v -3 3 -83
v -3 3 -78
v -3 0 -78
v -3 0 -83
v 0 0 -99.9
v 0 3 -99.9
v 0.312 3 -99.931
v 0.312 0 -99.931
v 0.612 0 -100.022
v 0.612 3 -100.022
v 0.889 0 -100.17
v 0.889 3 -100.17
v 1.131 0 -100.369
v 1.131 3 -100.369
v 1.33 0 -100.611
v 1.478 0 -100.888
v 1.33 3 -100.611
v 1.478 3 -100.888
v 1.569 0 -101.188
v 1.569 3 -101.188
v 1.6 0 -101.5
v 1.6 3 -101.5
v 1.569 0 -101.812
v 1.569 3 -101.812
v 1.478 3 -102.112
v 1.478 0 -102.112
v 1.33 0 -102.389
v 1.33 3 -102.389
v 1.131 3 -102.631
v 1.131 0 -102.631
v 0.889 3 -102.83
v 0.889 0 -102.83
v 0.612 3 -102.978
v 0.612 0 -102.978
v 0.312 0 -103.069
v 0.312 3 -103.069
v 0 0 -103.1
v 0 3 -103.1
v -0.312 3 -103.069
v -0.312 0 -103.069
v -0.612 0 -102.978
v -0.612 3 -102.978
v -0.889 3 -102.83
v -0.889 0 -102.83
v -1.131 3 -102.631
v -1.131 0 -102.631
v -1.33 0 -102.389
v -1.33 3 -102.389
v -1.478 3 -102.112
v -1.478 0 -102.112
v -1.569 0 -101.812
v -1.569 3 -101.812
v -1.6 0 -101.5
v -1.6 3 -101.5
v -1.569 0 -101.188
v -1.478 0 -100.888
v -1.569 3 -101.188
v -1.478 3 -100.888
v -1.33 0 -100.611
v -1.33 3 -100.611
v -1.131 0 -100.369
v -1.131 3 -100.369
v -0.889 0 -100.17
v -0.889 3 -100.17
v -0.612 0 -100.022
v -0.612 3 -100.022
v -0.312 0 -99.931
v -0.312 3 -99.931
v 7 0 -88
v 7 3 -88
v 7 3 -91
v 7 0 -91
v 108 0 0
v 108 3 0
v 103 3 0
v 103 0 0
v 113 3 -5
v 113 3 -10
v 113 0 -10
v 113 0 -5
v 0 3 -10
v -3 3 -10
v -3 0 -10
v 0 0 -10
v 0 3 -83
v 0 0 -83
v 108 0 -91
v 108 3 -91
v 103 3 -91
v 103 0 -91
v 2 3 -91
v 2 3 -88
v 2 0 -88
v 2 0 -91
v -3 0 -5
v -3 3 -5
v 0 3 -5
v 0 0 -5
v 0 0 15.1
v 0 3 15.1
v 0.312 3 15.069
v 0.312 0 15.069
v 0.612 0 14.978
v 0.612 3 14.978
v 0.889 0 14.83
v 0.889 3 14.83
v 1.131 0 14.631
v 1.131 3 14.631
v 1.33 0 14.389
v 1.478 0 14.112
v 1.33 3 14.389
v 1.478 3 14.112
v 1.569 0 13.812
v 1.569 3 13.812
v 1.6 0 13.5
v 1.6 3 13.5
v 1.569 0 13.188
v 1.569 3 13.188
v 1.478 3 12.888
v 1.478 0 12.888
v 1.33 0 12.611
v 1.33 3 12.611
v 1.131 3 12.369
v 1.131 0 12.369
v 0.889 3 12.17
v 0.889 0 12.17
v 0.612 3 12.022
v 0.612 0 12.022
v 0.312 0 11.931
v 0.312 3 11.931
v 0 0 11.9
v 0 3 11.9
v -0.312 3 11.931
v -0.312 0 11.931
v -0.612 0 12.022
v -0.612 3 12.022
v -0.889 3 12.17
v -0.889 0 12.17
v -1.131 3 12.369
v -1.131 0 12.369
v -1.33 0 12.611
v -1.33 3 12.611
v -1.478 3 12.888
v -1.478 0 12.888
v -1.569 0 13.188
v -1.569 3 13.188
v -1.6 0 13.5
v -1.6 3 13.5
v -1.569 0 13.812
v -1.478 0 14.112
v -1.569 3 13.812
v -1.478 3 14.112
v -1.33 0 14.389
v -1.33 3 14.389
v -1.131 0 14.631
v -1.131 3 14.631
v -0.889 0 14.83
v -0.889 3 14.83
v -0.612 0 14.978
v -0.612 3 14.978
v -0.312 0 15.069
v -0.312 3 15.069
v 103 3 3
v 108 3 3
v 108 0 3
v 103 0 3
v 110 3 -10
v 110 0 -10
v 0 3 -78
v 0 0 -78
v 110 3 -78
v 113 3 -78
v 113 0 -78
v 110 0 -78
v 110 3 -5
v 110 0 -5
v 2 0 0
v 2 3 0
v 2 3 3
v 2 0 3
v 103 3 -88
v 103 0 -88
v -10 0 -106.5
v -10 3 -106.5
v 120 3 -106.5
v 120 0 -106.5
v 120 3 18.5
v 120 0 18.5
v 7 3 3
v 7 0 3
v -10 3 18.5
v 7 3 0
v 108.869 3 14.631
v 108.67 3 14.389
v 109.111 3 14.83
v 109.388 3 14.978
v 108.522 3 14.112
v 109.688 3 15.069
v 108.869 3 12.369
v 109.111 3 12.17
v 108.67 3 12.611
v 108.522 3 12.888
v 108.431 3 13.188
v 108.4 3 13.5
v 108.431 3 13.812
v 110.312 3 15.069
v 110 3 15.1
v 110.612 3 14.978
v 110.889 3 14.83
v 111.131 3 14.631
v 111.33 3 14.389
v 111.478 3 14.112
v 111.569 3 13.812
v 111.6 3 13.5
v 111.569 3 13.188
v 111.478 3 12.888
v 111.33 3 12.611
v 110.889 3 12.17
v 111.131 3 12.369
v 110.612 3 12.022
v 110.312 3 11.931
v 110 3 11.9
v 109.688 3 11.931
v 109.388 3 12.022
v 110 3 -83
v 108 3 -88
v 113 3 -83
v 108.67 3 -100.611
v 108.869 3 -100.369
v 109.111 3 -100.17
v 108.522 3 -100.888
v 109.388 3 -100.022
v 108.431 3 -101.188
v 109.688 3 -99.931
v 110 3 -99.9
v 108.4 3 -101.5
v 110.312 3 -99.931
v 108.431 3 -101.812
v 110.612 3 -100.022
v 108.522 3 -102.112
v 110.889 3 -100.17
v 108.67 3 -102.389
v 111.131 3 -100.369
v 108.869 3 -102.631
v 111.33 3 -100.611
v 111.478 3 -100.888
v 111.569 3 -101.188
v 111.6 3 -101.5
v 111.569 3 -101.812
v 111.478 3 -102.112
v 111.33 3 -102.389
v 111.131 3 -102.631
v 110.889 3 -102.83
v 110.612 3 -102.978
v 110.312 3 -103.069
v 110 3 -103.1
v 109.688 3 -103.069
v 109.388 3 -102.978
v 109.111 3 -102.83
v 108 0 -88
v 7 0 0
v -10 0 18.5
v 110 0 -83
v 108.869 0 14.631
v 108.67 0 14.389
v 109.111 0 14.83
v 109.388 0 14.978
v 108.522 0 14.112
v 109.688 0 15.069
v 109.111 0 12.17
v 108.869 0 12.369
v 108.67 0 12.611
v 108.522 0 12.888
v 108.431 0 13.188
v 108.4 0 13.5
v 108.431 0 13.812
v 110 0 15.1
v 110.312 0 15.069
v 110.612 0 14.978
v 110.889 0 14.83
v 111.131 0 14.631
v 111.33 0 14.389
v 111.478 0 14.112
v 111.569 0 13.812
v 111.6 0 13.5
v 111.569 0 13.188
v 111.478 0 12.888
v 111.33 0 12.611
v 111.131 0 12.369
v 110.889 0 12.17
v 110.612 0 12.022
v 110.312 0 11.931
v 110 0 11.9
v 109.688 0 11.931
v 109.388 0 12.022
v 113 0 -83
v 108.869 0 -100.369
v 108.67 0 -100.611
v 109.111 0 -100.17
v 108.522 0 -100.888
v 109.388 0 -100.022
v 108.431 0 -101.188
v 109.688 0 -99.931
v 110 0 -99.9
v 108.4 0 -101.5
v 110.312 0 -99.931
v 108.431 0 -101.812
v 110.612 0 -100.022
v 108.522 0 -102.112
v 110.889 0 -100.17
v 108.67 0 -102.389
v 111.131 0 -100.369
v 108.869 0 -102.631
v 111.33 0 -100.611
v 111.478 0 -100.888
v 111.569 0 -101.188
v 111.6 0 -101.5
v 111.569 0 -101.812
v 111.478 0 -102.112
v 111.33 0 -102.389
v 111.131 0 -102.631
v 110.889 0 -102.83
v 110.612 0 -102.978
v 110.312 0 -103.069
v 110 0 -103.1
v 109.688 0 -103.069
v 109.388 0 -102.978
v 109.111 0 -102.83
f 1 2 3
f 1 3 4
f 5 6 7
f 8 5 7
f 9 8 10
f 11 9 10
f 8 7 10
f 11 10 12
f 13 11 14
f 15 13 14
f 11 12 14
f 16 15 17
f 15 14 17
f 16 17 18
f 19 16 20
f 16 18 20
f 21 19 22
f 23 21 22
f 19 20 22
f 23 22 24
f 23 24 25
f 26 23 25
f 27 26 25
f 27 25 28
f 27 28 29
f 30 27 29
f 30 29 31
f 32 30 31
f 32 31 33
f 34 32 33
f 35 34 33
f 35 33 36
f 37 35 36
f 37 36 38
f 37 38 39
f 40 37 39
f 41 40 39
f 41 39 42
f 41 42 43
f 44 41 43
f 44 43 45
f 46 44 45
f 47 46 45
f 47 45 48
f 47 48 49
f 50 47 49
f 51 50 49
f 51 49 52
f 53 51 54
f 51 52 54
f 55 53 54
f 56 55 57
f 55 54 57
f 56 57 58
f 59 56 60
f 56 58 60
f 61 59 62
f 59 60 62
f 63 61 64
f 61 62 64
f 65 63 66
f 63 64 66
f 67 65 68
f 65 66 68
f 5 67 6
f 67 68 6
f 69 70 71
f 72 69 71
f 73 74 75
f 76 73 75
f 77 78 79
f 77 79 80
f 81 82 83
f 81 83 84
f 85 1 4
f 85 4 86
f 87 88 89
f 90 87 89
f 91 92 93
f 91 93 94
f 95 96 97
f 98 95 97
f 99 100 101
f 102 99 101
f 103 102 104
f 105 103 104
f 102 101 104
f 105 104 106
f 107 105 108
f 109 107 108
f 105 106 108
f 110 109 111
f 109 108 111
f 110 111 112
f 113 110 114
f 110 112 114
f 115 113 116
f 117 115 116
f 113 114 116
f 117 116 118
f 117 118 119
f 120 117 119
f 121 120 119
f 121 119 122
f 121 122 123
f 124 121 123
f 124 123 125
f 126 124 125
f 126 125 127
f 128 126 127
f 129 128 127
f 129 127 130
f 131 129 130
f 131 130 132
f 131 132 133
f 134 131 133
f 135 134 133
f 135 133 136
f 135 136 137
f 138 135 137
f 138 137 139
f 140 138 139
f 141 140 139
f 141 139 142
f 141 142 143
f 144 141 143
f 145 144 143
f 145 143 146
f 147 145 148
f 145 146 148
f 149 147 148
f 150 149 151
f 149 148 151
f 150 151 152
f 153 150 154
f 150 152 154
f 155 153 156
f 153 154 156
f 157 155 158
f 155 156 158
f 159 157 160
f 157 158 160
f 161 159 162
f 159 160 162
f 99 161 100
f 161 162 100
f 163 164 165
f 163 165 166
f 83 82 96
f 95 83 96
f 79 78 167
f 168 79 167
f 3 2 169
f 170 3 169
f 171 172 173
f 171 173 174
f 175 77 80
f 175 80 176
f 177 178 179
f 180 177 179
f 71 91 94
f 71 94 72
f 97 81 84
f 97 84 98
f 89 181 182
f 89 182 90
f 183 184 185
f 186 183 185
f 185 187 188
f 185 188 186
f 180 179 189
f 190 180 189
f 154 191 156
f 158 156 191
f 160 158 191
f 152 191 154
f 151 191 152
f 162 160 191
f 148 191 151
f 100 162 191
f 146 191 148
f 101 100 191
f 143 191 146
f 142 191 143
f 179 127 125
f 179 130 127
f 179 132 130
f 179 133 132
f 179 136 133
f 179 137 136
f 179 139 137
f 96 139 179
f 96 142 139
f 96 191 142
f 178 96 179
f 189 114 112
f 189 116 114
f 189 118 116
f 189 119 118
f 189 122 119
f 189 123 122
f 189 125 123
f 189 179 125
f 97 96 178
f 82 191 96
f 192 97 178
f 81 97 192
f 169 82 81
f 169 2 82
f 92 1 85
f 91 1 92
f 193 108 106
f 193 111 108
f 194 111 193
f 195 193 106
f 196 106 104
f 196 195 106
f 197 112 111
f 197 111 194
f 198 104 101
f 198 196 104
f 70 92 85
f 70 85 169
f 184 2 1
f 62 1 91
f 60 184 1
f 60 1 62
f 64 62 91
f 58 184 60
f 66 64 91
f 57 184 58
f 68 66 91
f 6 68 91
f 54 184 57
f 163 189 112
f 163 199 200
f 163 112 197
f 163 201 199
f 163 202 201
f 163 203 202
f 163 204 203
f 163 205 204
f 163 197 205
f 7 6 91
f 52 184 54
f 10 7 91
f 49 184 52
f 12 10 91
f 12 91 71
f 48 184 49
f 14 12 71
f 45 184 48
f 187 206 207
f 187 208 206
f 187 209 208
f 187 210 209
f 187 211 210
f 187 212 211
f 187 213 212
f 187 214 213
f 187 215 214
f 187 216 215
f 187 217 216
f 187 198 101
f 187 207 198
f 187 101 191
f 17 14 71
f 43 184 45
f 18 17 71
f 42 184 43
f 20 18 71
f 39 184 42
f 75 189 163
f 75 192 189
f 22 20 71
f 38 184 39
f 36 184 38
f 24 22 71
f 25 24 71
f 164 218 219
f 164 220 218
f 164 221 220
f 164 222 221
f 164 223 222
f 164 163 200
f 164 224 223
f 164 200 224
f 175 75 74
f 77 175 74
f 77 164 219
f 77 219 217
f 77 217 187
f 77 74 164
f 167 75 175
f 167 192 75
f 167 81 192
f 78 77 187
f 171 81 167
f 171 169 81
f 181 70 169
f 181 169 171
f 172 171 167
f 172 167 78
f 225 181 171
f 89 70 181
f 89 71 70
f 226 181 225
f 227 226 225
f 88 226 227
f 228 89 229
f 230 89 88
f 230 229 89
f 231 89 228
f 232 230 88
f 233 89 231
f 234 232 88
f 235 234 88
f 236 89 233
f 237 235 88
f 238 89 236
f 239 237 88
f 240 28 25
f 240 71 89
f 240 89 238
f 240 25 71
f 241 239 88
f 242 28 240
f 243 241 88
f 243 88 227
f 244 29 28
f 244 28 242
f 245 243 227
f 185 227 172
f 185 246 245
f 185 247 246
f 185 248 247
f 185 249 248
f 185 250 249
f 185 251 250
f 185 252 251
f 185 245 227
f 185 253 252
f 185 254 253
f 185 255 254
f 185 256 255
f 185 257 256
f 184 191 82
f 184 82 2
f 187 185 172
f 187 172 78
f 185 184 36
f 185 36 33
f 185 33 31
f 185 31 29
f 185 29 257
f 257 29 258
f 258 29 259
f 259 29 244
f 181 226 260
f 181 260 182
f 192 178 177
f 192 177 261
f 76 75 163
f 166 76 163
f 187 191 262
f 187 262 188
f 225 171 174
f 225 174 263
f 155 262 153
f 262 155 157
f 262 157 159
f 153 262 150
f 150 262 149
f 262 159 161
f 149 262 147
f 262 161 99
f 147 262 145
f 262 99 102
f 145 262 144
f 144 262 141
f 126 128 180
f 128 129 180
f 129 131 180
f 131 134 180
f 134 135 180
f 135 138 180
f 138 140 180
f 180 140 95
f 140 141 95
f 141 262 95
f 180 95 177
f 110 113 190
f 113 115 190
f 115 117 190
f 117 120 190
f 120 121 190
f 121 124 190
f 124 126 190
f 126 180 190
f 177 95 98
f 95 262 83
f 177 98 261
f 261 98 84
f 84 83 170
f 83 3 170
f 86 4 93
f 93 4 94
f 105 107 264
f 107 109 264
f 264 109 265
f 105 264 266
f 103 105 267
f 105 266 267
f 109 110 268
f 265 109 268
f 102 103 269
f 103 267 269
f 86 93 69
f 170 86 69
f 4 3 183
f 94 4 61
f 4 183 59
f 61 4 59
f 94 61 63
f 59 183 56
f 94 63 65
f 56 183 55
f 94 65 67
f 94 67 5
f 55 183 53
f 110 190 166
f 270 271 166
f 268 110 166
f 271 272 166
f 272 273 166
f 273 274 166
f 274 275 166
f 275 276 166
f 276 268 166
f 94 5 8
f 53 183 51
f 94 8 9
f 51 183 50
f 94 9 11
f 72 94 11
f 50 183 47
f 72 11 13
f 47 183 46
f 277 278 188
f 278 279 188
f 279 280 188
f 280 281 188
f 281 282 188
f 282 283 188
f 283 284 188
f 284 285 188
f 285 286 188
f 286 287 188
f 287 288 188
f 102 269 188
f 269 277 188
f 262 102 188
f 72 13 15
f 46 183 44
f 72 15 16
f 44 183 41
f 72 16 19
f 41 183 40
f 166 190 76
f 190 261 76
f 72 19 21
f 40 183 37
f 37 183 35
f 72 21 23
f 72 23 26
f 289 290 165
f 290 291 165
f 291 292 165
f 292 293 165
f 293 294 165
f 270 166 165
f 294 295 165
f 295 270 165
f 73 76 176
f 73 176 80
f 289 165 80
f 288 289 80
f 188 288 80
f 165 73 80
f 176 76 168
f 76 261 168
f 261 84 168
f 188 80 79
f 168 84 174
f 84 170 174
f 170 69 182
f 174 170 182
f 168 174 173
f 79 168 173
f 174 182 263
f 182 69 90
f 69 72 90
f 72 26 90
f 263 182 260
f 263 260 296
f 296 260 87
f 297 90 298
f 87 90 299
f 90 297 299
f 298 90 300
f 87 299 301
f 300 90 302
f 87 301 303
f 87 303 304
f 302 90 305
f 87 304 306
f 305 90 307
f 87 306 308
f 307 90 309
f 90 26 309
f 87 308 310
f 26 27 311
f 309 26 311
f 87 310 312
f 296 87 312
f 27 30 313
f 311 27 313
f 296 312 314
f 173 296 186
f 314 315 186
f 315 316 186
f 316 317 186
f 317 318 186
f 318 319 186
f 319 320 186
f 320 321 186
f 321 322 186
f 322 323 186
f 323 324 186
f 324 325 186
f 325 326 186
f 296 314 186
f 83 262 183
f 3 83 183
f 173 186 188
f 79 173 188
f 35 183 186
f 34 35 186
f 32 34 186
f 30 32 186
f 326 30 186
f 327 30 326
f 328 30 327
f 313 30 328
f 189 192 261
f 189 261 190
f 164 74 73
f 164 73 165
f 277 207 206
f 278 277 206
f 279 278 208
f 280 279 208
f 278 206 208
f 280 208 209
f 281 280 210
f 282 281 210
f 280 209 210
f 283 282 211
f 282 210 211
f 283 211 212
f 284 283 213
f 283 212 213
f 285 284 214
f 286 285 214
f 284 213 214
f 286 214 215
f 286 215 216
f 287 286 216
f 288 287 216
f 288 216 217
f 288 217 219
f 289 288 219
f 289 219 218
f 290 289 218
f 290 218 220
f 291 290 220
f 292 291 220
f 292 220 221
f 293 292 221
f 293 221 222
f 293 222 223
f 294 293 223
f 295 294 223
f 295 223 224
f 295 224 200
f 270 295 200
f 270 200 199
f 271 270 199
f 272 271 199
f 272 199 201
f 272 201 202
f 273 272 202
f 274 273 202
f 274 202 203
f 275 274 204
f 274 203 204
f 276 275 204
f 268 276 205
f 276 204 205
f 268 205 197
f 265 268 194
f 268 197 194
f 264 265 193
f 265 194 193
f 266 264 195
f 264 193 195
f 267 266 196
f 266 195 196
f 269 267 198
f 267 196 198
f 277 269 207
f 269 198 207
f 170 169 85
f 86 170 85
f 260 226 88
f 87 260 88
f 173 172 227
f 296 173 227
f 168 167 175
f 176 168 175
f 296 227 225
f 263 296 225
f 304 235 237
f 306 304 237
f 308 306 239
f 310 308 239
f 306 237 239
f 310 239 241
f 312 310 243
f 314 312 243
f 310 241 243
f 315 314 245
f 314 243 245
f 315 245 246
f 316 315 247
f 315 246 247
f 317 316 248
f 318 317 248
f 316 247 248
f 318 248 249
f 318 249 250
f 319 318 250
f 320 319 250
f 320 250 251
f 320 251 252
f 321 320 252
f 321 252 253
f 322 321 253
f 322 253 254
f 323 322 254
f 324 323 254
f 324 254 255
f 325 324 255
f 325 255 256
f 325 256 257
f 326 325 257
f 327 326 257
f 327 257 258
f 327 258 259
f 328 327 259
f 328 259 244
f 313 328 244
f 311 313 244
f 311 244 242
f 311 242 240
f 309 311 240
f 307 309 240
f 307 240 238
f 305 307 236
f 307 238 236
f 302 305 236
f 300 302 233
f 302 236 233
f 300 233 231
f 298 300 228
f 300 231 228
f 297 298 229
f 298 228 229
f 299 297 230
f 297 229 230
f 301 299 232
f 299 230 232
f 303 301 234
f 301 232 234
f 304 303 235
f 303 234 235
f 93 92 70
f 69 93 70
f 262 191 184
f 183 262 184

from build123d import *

# Parameters (mm, degrees)
SKETCH_2_W                 = 130
SKETCH_2_H                 = 108
EXTRUDE_1_DEPTH            = 3
SKETCH_3_W                 = 5
SKETCH_3_H                 = 3
SKETCH_3_W_2               = 3
SKETCH_3_H_2               = 5
CUT_EXTRUDE_1_DEPTH        = 155.961285488
MIRROR_2_COPY_1_SKETCH_W   = 5
MIRROR_2_COPY_1_SKETCH_H   = 3
MIRROR_2_COPY_1_SKETCH_W_2 = 3
MIRROR_2_COPY_1_SKETCH_H_2 = 5
MIRROR_2_COPY_1_DEPTH      = 155.961285488
SKETCH_5_W                 = 130
SKETCH_5_H                 = 8.5
EXTRUDE_2_DEPTH            = 3
SKETCH_6_R                 = 1.6
CUT_EXTRUDE_2_DEPTH        = 161.471960168


with BuildPart() as part:
    # 草图2 → 凸台-拉伸1 (new body)
    with BuildSketch(Plane(origin=(0, 0, 0), x_dir=(1, 0, 0), z_dir=(0, 1, 0))):
        with Locations((55, 44)):
            Rectangle(SKETCH_2_W, SKETCH_2_H)
    extrude(amount=EXTRUDE_1_DEPTH)

    # 草图3 → 切除-拉伸1 (cut, through all)
    with BuildSketch(Plane(origin=(0, 3, 0), x_dir=(1, 0, 0), z_dir=(0, 1, 0))):
        with Locations((4.5, 89.5)):
            Rectangle(SKETCH_3_W, SKETCH_3_H)
        with Locations((-1.5, 80.5)):
            Rectangle(SKETCH_3_W_2, SKETCH_3_H_2)
    cut_extrude_1 = extrude(amount=-CUT_EXTRUDE_1_DEPTH, mode=Mode.SUBTRACT)

    # 镜向1: 切除-拉伸1 across plane
    add(cut_extrude_1.mirror(Plane.ZY.offset(-55)), mode=Mode.SUBTRACT)

    # 镜向2: 切除-拉伸1 across plane
    add(cut_extrude_1.mirror(Plane(origin=(0, 0, -44), x_dir=(1, 0, 0), z_dir=(0, 0, -1))), mode=Mode.SUBTRACT)

    # 镜向2 copy 1 sketch → 镜向2 copy 1 (cut, through all)
    with BuildSketch(Plane(origin=(110, 3, -88), x_dir=(-1, 0, 0), z_dir=(0, 1, 0))):
        with Locations((4.5, 89.5)):
            Rectangle(MIRROR_2_COPY_1_SKETCH_W, MIRROR_2_COPY_1_SKETCH_H)
        with Locations((-1.5, 80.5)):
            Rectangle(MIRROR_2_COPY_1_SKETCH_W_2, MIRROR_2_COPY_1_SKETCH_H_2)
    extrude(amount=-MIRROR_2_COPY_1_DEPTH, mode=Mode.SUBTRACT)

    # 草图5 → 凸台-拉伸2 (add)
    with BuildSketch(Plane(origin=(0, 3, 0), x_dir=(1, 0, 0), z_dir=(0, 1, 0))):
        with Locations((55, 102.25)):
            Rectangle(SKETCH_5_W, SKETCH_5_H)
        with Locations((55, -14.25)):
            Rectangle(SKETCH_5_W, SKETCH_5_H)
    extrude(amount=-EXTRUDE_2_DEPTH)

    # 草图6 → 切除-拉伸2 (cut, through all)
    with BuildSketch(Plane(origin=(0, 3, 0), x_dir=(1, 0, 0), z_dir=(0, 1, 0))):
        with Locations(Location((0, 101.5, 0), (0, 0, 270))):
            Circle(SKETCH_6_R)
        with Locations(Location((0, -13.5, 0), (0, 0, 270))):
            Circle(SKETCH_6_R)
        with Locations(Location((110, 101.5, 0), (0, 0, 270))):
            Circle(SKETCH_6_R)
        with Locations(Location((110, -13.5, 0), (0, 0, 270))):
            Circle(SKETCH_6_R)
    extrude(amount=-CUT_EXTRUDE_2_DEPTH, mode=Mode.SUBTRACT)


solid = part.part
